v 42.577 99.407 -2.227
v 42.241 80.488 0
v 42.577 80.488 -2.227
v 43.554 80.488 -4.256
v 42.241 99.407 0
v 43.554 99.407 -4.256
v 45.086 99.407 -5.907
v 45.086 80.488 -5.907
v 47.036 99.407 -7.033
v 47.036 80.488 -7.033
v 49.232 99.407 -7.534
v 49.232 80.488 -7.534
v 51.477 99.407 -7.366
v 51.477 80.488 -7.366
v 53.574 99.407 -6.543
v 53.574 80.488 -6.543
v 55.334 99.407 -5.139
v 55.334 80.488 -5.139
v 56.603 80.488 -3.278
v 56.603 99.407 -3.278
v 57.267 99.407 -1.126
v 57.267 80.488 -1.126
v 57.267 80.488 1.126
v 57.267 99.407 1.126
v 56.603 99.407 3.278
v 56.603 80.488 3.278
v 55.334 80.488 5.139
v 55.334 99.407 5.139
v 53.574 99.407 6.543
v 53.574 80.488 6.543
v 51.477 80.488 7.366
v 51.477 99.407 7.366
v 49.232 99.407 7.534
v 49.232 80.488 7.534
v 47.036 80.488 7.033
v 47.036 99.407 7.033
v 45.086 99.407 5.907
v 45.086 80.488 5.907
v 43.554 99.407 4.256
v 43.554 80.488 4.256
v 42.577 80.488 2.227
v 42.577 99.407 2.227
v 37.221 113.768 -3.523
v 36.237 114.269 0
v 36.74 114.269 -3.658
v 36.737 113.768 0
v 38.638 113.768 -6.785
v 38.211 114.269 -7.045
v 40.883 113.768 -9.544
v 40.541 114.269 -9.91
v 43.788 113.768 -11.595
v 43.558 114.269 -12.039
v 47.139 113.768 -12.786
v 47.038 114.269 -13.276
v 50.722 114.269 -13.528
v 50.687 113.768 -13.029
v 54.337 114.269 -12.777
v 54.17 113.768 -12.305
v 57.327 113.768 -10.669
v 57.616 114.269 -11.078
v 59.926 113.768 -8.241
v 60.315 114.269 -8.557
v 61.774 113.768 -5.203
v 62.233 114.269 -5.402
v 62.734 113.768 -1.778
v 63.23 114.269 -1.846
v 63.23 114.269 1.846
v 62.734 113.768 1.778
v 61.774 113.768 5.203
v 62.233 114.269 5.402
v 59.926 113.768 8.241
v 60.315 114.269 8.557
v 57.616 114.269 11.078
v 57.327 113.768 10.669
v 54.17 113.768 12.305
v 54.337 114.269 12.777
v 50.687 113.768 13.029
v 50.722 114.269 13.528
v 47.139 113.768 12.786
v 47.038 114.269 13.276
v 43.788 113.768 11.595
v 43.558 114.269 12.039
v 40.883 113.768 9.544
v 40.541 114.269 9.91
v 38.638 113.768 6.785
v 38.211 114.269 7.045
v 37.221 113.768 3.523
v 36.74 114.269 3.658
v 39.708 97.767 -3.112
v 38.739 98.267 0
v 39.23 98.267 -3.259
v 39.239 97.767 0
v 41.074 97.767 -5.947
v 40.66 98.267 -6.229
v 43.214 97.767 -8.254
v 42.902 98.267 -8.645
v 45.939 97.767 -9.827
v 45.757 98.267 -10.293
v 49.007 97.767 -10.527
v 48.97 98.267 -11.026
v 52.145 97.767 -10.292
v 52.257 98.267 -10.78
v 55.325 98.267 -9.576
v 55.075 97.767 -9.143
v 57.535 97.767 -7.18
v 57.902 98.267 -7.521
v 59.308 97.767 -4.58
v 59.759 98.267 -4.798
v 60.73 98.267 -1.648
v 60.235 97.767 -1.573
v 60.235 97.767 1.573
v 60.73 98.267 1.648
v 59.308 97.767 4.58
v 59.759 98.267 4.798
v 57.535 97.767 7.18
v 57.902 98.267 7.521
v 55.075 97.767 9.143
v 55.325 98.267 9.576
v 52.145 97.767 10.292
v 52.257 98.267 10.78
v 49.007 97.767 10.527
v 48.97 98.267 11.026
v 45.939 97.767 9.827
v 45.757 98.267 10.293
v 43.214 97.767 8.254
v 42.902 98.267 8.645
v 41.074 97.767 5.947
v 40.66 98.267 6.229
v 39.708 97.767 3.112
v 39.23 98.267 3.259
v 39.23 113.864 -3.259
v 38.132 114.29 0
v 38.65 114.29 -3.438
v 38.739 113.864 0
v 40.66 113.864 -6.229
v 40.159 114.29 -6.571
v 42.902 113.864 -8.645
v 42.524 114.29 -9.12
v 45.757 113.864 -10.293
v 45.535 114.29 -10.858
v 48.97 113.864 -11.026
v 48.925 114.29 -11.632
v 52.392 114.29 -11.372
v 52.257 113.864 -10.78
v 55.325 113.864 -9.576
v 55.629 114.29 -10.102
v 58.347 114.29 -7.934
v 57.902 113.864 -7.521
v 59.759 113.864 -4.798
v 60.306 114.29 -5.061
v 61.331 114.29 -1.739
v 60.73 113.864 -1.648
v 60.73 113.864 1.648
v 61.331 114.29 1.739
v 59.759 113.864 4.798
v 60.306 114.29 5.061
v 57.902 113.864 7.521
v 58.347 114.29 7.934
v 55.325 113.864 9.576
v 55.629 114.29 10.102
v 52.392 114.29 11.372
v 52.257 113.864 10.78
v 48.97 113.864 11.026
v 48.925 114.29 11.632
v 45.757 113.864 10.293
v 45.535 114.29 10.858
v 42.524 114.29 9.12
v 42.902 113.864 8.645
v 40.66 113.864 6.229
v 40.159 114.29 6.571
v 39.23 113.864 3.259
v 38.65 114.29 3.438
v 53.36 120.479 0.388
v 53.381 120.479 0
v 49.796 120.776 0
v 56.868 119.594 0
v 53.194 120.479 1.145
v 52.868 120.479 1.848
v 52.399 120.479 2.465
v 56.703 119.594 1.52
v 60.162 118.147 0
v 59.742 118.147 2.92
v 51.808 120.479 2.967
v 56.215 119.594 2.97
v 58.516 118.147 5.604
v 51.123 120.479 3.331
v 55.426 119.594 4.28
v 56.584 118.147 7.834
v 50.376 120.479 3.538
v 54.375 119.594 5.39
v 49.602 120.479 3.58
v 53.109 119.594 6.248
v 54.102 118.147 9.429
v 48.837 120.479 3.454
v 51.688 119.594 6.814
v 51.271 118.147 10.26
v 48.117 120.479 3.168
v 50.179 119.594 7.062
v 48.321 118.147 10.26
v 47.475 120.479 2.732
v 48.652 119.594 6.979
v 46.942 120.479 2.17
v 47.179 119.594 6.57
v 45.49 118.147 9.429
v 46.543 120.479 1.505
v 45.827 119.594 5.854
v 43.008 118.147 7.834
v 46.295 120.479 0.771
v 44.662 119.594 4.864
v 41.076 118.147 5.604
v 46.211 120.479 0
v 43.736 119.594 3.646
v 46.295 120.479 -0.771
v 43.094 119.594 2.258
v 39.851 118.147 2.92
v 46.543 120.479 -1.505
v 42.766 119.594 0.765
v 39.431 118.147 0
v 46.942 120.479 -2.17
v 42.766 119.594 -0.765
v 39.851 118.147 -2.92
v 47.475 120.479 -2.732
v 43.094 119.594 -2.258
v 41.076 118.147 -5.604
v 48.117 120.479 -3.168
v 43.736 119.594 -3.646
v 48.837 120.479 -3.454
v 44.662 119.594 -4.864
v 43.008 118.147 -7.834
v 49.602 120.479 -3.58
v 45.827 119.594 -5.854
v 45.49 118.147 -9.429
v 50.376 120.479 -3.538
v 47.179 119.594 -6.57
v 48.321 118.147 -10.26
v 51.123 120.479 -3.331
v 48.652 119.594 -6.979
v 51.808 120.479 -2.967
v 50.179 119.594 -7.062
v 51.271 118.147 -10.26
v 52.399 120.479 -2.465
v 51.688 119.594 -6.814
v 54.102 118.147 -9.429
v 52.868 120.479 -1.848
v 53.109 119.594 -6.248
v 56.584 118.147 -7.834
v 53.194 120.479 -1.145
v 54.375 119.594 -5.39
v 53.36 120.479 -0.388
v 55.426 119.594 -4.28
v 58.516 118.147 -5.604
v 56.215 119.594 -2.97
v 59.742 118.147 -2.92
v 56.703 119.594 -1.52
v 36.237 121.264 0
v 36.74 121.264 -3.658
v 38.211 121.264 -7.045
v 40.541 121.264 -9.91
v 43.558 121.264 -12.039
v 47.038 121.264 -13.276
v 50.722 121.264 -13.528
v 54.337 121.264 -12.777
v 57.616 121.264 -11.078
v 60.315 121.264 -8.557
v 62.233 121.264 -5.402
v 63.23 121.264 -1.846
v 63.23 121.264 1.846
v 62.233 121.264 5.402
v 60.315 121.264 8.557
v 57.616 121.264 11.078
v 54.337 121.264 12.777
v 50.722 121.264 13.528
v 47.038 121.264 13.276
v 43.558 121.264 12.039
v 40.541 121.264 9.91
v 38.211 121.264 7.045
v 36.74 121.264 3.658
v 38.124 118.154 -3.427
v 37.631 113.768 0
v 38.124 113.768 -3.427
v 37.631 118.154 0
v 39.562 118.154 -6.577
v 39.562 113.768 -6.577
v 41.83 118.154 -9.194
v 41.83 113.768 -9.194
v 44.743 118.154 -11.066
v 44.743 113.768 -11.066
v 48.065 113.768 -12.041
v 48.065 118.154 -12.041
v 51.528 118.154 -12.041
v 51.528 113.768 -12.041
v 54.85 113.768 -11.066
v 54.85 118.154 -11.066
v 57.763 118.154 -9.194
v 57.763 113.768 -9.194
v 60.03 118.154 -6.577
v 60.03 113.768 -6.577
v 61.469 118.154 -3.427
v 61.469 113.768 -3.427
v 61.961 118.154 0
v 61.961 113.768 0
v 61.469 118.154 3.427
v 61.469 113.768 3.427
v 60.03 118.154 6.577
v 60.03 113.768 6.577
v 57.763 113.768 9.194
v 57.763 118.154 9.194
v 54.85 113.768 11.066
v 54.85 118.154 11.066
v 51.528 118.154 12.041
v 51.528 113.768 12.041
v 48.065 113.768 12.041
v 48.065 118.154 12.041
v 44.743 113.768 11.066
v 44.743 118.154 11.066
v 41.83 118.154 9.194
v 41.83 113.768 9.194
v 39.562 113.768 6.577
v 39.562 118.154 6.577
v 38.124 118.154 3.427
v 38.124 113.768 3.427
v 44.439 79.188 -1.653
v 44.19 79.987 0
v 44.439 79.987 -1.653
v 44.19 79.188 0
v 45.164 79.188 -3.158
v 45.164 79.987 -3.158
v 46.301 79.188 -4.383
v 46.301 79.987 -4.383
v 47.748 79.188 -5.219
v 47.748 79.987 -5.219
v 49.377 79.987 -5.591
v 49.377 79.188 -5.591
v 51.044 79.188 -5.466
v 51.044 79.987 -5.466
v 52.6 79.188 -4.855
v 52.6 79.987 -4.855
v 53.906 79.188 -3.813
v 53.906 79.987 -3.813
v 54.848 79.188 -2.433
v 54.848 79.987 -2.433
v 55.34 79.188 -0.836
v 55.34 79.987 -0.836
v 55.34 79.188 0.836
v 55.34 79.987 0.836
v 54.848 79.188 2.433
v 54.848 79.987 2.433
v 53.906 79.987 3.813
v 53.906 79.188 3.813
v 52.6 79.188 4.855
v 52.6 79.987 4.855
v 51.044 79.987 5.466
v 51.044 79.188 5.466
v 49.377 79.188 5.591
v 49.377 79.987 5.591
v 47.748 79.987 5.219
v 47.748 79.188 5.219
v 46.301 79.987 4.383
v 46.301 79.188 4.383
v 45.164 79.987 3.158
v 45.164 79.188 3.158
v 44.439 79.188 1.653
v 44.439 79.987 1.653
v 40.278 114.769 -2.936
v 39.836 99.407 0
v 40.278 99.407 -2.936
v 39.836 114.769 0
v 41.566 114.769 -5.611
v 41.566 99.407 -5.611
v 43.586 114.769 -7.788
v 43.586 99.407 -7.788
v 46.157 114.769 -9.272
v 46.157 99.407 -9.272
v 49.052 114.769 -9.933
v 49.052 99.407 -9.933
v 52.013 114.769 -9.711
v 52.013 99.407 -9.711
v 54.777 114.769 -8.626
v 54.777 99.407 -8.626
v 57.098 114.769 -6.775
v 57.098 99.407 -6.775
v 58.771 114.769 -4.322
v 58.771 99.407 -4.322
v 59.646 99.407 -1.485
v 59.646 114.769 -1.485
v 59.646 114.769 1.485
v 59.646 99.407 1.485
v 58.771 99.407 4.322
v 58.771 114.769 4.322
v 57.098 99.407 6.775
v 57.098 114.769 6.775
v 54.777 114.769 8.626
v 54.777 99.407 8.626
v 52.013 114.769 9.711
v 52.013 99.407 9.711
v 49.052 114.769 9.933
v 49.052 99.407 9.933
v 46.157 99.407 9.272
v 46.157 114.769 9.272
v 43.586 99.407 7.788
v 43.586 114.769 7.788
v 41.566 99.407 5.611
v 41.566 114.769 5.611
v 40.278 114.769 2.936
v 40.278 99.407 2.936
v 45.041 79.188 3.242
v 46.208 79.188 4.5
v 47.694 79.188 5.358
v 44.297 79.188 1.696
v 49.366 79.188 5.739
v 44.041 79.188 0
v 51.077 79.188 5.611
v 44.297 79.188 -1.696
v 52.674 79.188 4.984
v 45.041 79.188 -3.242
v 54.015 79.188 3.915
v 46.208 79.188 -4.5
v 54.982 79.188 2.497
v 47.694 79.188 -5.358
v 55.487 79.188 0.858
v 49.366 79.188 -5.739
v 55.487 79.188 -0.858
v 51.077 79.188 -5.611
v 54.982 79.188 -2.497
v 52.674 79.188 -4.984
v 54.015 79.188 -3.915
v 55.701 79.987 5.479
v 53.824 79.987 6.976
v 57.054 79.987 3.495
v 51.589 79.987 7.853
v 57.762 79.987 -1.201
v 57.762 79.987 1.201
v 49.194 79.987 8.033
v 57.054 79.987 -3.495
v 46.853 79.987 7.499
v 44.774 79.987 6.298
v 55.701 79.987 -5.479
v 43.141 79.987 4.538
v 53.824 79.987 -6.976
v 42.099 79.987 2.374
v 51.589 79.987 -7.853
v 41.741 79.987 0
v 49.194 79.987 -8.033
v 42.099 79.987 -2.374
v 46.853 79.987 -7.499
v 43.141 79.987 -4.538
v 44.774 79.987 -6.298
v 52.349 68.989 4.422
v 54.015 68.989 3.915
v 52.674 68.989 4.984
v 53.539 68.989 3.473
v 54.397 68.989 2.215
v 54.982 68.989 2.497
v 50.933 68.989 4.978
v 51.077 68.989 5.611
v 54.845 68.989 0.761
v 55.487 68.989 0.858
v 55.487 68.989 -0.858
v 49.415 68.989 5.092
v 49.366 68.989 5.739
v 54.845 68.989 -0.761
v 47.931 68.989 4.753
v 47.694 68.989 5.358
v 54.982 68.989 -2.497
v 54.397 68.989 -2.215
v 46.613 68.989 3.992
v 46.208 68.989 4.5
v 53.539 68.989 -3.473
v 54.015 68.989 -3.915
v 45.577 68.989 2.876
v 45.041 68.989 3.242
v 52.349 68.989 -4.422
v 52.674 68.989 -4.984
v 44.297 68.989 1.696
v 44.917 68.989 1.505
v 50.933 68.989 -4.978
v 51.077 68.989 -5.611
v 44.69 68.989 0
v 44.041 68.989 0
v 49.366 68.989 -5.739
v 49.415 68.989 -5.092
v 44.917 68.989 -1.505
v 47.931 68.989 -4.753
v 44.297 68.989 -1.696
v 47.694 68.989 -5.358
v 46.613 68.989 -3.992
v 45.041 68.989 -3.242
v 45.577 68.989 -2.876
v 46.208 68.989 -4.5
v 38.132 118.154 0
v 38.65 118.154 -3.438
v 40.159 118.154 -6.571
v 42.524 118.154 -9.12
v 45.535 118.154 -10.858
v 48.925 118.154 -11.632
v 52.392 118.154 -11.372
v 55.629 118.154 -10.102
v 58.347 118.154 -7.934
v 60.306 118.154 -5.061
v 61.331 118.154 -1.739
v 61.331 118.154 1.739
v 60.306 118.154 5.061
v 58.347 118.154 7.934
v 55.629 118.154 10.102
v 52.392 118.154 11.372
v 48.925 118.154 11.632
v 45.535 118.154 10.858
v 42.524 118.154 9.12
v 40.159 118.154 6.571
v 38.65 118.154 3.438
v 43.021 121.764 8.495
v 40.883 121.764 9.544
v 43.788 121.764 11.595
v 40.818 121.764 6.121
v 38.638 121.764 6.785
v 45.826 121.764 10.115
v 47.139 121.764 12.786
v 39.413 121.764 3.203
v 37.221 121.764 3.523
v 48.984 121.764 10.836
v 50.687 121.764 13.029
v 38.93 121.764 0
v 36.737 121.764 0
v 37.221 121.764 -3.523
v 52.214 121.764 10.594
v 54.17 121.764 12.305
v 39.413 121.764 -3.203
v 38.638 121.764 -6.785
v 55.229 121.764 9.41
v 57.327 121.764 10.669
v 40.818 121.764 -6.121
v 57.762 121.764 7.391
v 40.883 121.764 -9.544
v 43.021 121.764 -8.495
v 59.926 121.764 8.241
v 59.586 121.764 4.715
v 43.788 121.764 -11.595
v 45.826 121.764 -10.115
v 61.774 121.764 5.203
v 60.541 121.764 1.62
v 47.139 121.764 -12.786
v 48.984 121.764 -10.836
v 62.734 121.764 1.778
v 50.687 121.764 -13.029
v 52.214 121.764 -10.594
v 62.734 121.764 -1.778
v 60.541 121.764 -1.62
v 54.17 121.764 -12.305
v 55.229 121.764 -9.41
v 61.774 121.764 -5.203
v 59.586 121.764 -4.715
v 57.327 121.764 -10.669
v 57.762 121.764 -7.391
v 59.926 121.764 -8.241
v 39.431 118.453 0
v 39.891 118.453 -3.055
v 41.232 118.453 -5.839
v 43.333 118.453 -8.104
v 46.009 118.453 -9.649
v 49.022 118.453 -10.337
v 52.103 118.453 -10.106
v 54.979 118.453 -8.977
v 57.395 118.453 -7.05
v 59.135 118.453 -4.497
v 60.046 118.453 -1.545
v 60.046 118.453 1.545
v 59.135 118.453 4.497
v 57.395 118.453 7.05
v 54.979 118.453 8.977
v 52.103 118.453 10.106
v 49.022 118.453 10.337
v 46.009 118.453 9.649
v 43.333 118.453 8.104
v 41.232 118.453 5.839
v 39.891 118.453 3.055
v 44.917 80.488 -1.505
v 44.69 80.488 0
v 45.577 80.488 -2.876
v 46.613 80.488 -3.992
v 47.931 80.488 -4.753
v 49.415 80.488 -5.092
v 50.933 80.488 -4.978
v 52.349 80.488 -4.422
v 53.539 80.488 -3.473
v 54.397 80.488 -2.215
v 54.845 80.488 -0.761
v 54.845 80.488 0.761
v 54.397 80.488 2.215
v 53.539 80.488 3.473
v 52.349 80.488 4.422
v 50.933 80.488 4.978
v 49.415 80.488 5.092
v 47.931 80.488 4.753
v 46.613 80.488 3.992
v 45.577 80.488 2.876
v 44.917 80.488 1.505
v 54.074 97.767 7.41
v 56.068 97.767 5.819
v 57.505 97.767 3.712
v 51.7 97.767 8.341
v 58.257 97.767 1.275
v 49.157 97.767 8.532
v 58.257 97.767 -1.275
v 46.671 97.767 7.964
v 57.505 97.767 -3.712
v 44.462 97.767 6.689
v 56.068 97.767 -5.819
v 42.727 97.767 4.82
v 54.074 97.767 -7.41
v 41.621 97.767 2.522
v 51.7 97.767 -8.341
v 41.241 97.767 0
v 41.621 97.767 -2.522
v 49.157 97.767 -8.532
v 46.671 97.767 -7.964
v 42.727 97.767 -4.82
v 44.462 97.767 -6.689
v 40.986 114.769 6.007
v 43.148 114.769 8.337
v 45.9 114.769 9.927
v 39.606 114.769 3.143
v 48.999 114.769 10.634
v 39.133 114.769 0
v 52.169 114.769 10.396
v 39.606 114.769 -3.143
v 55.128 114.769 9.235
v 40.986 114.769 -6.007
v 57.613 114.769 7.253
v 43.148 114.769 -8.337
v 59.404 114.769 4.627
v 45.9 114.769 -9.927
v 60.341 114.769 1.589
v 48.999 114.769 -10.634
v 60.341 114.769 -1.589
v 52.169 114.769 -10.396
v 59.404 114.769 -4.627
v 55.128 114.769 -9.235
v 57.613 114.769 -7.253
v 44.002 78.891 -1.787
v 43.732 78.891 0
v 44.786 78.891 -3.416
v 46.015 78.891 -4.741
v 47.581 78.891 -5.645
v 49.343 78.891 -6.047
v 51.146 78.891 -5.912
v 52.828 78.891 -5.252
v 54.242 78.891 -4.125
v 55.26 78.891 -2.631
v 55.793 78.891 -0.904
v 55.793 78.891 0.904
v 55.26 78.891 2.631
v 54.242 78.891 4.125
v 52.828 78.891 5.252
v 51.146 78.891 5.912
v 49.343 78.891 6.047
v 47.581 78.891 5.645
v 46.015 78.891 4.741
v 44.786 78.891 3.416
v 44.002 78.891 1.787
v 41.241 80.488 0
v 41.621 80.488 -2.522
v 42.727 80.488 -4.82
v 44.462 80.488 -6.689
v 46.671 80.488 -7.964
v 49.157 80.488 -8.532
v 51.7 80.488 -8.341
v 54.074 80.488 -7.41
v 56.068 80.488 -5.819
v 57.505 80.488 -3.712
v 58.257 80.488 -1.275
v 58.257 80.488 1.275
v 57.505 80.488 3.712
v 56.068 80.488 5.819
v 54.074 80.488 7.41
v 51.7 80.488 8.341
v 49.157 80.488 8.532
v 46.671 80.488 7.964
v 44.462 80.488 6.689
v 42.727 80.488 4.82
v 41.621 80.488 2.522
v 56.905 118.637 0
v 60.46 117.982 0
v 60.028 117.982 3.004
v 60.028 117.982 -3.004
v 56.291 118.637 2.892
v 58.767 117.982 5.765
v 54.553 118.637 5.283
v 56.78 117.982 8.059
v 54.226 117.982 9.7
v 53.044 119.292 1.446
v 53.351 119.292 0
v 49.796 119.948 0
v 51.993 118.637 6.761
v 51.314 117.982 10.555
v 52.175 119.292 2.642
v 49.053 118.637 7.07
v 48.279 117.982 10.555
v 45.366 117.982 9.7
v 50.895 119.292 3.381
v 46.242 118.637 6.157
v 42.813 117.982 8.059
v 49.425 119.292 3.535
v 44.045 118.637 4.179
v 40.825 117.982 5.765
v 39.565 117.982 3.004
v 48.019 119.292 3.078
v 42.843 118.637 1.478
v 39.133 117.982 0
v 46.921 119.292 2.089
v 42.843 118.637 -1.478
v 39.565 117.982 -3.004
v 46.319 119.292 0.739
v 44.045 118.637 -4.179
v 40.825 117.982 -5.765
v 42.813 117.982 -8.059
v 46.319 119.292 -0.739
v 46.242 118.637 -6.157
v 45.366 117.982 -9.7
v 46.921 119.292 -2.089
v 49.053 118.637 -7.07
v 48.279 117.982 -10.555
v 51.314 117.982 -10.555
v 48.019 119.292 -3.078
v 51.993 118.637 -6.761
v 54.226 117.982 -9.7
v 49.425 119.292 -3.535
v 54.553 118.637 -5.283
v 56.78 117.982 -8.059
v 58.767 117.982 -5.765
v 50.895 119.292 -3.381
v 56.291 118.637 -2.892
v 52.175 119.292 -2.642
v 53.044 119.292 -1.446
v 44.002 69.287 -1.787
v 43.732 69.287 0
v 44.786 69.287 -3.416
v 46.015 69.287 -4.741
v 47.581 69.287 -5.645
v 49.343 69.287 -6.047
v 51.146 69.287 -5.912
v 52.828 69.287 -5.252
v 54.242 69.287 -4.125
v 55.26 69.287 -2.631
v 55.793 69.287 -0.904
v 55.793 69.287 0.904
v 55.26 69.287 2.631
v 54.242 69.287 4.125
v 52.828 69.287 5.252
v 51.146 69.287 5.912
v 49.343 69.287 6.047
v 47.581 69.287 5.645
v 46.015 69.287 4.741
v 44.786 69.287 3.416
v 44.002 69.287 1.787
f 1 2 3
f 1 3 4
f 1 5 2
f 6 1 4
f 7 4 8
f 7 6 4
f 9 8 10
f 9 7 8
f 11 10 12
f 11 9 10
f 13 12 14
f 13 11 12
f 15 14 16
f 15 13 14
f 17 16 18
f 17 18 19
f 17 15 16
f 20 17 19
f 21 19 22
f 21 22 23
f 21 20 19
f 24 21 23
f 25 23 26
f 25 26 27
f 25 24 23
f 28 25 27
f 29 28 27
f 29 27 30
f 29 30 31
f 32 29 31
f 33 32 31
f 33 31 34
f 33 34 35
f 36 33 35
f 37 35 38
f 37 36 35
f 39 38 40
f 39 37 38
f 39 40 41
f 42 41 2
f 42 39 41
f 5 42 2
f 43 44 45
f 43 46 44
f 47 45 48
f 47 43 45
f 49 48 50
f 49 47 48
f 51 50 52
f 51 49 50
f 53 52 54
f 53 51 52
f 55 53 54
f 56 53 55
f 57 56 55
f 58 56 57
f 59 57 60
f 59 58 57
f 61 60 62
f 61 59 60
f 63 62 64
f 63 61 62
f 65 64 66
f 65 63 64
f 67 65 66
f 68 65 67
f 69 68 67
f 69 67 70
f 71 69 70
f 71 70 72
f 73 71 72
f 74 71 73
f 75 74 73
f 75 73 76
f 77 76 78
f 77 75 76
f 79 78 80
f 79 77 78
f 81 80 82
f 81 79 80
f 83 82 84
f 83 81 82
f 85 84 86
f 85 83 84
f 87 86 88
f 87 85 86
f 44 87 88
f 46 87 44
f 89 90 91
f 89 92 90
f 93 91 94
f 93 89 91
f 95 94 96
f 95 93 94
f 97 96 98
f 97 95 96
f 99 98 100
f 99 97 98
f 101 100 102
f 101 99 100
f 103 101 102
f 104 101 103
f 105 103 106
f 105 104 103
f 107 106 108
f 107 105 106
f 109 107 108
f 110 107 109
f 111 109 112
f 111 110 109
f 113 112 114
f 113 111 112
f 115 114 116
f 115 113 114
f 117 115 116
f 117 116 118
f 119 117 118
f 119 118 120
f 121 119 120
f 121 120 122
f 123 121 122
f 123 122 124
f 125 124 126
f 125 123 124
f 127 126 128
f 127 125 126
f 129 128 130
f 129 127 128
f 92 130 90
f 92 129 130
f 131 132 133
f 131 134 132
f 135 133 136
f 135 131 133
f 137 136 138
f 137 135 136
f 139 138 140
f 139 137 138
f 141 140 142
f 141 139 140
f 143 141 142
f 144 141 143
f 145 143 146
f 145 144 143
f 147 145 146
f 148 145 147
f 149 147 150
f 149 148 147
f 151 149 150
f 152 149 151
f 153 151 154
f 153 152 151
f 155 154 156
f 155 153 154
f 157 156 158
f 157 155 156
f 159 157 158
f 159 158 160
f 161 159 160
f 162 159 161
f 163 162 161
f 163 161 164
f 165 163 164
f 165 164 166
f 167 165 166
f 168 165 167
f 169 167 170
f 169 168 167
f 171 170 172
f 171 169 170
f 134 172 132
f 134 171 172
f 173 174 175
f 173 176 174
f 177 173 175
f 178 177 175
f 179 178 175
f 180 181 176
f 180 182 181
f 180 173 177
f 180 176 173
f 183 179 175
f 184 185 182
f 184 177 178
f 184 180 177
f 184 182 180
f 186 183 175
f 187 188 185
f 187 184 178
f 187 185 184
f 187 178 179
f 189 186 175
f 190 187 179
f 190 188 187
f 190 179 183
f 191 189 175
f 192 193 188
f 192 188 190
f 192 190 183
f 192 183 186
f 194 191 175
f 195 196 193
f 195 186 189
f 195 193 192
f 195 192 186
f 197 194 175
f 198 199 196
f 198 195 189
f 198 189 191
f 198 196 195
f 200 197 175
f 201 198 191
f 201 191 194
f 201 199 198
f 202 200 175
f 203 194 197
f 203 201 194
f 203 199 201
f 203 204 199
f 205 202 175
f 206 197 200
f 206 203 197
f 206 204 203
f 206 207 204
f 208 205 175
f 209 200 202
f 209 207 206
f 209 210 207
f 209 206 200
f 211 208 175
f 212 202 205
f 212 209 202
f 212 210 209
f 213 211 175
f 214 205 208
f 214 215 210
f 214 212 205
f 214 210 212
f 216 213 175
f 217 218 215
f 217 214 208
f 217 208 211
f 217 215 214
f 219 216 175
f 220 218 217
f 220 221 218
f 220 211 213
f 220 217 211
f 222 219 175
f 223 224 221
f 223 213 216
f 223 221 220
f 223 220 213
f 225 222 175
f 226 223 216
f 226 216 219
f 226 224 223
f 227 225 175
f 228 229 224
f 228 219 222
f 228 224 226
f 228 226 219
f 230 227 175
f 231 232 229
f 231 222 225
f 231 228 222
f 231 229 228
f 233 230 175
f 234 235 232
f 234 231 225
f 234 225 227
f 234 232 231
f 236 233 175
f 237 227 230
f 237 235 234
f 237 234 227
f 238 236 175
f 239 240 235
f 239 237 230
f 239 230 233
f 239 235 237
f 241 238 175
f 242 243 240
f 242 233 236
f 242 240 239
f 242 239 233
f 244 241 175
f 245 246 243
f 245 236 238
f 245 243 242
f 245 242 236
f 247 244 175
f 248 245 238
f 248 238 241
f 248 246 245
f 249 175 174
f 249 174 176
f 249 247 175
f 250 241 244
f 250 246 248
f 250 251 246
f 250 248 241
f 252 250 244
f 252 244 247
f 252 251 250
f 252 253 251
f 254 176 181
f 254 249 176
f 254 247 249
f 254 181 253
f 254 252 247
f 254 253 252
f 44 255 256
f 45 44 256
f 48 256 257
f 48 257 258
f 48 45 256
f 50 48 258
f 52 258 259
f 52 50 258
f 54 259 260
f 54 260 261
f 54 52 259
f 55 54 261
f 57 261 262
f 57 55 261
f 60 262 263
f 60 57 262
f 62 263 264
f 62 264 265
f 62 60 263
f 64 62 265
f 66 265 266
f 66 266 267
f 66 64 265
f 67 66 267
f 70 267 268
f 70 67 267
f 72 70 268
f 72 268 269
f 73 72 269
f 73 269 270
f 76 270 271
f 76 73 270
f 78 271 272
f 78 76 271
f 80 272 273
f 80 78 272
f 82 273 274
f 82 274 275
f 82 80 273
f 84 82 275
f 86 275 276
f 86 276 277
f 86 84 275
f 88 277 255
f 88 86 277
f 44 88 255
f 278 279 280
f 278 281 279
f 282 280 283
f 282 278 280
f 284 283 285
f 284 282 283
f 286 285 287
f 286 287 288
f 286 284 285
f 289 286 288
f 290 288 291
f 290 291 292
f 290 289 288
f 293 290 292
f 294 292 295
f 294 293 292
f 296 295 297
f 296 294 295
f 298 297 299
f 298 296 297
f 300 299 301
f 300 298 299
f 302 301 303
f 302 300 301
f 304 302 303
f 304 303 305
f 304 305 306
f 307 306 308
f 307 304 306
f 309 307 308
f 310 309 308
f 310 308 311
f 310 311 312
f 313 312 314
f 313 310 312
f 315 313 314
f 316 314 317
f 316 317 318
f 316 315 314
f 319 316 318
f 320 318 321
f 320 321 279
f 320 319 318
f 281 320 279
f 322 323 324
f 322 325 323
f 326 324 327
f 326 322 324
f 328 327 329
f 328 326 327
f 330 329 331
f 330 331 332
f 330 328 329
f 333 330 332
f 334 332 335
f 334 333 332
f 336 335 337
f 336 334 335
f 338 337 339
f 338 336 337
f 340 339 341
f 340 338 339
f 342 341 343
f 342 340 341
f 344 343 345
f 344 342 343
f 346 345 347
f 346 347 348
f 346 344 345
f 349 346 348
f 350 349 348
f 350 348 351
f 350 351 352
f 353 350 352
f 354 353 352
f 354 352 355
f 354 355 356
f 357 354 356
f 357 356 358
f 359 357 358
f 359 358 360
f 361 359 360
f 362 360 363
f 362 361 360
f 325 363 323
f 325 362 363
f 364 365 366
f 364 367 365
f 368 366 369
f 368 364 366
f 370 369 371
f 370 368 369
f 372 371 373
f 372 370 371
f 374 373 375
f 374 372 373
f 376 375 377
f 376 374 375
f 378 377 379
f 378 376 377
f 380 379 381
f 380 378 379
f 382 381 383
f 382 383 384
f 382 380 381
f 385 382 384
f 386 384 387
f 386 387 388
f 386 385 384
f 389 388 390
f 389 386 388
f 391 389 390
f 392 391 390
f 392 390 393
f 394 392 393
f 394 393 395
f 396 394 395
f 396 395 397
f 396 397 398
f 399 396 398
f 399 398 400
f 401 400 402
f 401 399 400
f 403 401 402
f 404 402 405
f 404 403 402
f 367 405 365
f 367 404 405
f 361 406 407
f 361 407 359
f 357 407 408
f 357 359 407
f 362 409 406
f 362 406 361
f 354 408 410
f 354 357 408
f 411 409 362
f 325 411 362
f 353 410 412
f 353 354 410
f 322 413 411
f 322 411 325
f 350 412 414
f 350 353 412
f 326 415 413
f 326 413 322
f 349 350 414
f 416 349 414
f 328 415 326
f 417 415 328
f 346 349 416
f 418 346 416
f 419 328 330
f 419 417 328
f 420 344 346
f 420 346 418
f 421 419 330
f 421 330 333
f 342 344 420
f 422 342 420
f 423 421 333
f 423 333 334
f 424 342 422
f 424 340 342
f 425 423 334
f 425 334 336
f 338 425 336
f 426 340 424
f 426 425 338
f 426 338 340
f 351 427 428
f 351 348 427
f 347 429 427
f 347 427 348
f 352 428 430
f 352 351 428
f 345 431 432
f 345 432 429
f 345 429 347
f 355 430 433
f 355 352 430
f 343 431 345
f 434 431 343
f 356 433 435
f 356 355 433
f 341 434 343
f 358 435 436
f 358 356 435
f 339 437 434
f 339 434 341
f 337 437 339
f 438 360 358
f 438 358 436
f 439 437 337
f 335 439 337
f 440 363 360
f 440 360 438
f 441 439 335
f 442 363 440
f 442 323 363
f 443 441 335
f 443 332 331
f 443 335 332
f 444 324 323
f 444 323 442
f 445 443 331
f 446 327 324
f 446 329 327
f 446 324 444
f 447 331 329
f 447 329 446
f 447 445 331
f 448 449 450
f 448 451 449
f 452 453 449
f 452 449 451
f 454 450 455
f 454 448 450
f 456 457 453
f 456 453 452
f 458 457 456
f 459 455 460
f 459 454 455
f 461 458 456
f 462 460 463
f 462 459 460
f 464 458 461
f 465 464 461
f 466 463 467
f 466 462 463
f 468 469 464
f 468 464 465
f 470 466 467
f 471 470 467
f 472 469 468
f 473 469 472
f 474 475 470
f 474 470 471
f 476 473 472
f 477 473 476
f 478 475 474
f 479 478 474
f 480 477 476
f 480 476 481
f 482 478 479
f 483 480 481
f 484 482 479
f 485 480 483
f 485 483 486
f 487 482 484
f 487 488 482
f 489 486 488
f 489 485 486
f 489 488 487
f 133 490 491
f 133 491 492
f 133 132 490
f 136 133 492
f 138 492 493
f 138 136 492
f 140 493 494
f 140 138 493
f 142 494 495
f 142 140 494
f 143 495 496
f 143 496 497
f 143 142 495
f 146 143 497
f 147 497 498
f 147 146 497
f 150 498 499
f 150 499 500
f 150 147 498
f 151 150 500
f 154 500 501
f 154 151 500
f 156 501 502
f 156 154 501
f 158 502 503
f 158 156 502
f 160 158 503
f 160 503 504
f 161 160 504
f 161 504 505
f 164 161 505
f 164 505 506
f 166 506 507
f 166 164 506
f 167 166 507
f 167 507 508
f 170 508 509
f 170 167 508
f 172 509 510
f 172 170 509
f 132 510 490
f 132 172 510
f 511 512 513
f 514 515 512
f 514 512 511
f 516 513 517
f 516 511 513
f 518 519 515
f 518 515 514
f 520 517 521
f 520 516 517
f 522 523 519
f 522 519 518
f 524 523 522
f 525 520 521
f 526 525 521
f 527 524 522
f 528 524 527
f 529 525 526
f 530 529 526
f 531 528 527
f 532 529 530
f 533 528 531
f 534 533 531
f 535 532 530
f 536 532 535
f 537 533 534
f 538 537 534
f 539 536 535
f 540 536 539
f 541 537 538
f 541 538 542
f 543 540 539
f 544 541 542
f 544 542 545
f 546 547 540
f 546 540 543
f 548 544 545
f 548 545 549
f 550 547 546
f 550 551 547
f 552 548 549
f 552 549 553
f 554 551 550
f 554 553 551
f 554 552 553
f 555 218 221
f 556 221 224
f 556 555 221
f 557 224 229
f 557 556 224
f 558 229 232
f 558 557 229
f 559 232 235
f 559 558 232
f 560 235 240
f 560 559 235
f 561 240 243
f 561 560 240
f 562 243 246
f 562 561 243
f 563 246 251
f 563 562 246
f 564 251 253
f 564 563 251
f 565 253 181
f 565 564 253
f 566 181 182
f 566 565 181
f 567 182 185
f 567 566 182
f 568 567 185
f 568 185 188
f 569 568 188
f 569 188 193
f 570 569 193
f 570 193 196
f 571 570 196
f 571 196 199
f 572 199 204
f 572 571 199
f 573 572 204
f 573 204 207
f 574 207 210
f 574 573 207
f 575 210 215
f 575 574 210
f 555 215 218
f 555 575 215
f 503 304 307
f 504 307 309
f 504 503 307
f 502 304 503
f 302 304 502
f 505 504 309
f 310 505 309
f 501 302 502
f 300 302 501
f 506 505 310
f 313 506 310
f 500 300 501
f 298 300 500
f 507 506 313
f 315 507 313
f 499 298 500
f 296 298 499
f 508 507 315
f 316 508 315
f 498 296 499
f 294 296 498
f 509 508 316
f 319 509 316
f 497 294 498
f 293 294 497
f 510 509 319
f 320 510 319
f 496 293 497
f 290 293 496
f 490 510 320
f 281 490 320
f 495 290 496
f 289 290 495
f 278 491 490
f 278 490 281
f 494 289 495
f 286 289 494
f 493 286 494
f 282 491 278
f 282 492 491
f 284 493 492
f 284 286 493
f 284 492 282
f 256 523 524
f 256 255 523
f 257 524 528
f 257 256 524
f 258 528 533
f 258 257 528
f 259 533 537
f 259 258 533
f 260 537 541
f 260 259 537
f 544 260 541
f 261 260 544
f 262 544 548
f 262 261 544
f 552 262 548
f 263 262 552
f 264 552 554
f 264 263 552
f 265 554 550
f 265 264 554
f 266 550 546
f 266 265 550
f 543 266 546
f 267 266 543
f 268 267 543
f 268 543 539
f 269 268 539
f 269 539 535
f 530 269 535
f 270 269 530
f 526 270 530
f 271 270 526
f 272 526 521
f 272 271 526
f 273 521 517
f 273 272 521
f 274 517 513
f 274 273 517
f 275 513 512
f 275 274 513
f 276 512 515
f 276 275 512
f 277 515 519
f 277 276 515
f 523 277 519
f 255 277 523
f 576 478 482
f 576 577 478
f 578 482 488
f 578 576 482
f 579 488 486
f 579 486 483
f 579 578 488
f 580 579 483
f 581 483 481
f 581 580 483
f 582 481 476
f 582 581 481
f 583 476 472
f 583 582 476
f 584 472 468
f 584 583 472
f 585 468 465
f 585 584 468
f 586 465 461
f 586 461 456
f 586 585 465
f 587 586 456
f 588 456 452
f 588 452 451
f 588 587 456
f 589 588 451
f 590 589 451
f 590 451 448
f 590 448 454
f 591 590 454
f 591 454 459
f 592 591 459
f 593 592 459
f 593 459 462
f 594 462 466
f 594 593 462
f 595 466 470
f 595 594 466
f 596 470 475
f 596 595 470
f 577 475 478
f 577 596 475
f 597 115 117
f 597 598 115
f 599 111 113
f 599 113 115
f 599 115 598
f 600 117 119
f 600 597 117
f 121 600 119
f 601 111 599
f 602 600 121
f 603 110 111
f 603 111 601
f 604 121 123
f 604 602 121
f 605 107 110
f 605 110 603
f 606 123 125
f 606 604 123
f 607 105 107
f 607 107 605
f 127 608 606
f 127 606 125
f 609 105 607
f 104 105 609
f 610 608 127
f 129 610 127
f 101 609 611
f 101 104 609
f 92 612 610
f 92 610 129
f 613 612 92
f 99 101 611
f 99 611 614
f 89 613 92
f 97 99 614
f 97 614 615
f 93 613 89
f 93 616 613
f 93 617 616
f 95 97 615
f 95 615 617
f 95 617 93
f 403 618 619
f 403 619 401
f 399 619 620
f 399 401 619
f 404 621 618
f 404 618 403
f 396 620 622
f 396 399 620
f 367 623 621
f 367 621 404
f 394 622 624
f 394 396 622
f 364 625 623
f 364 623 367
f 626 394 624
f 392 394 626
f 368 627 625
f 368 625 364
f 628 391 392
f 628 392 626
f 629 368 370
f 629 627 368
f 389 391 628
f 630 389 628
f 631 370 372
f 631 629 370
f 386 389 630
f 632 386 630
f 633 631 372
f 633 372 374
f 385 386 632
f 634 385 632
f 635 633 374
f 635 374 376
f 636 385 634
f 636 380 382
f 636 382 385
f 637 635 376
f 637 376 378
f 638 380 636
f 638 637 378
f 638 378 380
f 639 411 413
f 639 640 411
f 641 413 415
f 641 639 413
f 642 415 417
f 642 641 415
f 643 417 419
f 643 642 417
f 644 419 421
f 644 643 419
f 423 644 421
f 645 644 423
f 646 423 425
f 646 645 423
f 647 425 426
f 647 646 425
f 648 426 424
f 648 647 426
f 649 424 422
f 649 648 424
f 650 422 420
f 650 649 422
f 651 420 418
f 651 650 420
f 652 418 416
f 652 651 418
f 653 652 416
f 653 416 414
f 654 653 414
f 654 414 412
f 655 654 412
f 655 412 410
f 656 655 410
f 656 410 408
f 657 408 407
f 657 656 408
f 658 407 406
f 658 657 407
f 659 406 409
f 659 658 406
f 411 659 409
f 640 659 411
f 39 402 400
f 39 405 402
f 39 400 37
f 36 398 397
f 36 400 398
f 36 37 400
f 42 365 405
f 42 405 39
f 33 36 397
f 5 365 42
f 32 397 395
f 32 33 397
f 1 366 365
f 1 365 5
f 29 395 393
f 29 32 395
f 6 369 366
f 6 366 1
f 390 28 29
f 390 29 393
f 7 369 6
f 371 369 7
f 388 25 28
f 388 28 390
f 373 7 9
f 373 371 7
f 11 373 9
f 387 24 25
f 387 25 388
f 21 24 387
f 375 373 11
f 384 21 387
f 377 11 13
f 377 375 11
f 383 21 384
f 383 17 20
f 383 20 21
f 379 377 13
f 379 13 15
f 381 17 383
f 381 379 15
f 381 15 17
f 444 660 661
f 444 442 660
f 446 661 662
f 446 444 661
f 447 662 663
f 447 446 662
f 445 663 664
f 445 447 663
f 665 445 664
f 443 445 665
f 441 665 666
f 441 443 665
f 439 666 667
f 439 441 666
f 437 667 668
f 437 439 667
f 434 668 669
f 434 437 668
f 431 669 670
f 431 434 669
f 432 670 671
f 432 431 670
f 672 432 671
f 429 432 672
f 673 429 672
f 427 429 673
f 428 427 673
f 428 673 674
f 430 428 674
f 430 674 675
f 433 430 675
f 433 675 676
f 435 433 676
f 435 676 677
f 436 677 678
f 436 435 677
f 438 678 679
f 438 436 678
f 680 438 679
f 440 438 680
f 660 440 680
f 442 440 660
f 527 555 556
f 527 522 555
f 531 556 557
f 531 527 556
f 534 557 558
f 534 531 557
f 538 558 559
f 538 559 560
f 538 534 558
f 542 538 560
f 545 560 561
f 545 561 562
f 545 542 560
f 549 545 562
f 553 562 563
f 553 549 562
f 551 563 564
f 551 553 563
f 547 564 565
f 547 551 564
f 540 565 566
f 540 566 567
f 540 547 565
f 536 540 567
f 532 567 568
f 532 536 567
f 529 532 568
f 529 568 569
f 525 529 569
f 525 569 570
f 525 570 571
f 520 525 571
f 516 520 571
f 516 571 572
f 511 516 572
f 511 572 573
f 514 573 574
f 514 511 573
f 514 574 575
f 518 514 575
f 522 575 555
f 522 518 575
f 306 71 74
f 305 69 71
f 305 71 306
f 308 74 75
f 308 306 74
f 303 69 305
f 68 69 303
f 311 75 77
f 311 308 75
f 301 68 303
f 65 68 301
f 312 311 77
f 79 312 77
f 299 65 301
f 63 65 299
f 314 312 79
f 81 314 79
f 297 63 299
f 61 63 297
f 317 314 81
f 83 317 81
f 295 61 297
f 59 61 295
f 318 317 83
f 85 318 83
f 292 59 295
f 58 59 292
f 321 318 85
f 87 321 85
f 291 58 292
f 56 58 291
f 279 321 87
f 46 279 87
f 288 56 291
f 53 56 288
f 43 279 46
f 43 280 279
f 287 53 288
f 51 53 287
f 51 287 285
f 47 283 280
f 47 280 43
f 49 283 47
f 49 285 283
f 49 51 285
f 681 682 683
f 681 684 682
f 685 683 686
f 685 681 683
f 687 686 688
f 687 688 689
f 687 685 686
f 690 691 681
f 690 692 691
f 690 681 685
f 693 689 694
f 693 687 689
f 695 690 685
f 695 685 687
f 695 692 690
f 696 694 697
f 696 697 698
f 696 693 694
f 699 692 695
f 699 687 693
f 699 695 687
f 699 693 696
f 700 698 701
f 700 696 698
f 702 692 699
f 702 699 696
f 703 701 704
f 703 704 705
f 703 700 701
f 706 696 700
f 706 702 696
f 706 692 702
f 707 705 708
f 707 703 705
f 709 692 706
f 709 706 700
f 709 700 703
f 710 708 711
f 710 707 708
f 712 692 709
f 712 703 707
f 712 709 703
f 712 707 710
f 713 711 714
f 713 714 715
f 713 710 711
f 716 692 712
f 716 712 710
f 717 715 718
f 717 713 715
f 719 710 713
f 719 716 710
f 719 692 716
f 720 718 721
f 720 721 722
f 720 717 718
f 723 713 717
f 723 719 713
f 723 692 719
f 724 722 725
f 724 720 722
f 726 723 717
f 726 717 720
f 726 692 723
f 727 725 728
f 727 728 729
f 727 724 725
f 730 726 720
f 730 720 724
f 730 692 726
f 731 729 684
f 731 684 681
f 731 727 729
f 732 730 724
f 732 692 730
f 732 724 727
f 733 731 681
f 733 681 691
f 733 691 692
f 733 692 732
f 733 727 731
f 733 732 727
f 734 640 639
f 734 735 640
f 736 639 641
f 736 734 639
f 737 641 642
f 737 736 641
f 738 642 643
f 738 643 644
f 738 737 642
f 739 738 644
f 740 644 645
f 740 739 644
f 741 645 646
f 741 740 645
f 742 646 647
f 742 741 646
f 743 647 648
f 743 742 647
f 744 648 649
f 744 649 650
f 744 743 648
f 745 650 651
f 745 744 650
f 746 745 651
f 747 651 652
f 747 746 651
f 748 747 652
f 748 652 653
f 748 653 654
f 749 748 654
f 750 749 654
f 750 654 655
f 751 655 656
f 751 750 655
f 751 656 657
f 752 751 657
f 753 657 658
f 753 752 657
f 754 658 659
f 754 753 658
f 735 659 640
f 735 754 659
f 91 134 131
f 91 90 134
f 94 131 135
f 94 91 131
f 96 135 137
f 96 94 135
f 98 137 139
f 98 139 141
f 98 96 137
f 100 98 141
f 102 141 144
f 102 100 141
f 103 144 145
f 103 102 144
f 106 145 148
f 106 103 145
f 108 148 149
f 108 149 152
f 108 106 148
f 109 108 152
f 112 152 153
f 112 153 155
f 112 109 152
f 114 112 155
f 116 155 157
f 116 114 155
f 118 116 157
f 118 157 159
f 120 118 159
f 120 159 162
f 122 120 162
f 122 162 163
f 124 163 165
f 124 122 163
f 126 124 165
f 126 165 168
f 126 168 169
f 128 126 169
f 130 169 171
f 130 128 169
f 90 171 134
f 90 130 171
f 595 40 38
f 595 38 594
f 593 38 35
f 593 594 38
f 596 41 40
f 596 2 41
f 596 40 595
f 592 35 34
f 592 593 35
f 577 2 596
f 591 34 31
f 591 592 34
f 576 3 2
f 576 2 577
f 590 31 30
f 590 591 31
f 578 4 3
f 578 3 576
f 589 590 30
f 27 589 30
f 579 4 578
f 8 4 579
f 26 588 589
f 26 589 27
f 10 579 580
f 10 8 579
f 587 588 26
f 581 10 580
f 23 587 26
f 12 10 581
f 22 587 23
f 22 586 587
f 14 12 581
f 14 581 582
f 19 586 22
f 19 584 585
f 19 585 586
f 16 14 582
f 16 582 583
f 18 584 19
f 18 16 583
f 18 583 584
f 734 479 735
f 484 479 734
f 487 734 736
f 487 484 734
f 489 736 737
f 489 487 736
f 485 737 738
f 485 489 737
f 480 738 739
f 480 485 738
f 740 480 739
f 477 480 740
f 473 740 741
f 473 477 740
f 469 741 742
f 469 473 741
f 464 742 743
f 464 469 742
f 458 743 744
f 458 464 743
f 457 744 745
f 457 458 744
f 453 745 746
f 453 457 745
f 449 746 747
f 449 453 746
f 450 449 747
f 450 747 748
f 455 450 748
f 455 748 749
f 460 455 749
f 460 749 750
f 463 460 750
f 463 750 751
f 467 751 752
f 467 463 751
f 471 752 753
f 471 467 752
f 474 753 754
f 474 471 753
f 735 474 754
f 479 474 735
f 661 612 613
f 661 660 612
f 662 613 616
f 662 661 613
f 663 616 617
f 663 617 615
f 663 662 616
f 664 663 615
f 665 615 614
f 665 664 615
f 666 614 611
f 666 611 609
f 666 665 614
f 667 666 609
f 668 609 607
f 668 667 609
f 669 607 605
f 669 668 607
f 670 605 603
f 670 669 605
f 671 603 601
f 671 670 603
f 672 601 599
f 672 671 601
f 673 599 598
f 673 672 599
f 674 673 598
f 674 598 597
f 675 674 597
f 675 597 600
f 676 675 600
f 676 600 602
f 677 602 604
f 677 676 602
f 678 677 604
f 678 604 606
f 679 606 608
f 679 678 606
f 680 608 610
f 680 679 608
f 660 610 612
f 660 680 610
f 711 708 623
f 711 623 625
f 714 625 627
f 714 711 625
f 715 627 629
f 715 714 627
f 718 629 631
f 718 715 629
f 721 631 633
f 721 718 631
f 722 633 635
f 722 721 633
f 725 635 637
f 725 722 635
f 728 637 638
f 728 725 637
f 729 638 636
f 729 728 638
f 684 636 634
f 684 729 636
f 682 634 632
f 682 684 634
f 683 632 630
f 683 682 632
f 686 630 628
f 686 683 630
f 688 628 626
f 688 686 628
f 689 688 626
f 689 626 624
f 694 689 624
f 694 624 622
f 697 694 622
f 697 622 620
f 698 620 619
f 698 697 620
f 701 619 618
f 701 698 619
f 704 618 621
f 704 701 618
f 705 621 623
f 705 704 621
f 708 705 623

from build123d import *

# Parameters (mm, degrees)
SCALE1_SCALE = 0.502986482


with BuildPart() as part:
    # Model → Revolve1 (revolve)
    with BuildSketch(Plane.XY):
        with BuildLine():
            Line((28.595574, 124.840746), (28.595574, 131.228004974))
            ThreePointArc((28.595574, 131.228004974), (28.89122421, 131.392844904), (29.188156, 131.555364935))
            Line((29.188156, 131.555364935), (29.188156, 132.16509))
            Line((29.188156, 132.16509), (28.193238, 138.747754))
            Line((28.193238, 138.747754), (23.8331756, 138.747754))
            Line((23.8331756, 138.747754), (22.8382322, 137.752582))
            Line((22.8382322, 137.752582), (22.8382322, 123.845828))
            Line((22.8382322, 123.845828), (23.8331756, 122.850656))
            Line((23.8331756, 122.850656), (25.61082, 122.850656))
            Line((25.61082, 122.850656), (25.61082, 131.570984))
            Line((25.61082, 131.570984), (26.605738, 131.570984))
            Line((26.605738, 131.570984), (26.605738, 123.8885))
            Line((26.605738, 123.8885), (27.813, 123.040902))
            Line((27.813, 123.040902), (27.813, 92.032328))
            Line((27.813, 92.032328), (28.807918, 91.03741))
            Line((28.807918, 91.03741), (32.78632, 91.03741))
            Line((32.78632, 91.03741), (32.78632, 56.684418))
            Line((32.78632, 56.684418), (33.781238, 55.689246))
            Line((33.781238, 55.689246), (38.64991, 55.689246))
            Line((38.64991, 55.689246), (38.64991, 54.101746))
            Line((38.64991, 54.101746), (38.353746, 54.101746))
            Line((38.353746, 54.101746), (37.740082, 53.509418))
            Line((37.740082, 53.509418), (37.740082, 34.416492))
            Line((37.740082, 34.416492), (38.353746, 33.82391))
            Line((38.353746, 33.82391), (39.644828, 33.82391))
            Line((39.644828, 33.82391), (39.644828, 56.684418))
            Line((39.644828, 56.684418), (34.776156, 56.684418))
            Line((34.776156, 56.684418), (34.776156, 94.297754))
            Line((34.776156, 94.297754), (29.993082, 94.297754))
            Line((29.993082, 94.297754), (29.993082, 124.840746))
            Line((29.993082, 124.840746), (28.595574, 124.840746))
        make_face()
    revolve(axis=Axis((49.796303883, 136.783225344, 0), (0, -1, 0)))

    # Model<3> → Revolve2 (revolve)
    with BuildSketch(Plane.XY):
        with BuildLine():
            ThreePointArc((29.188156, 131.555364935), (28.89122421, 131.392844904), (28.595574, 131.228004974))
            Line((28.595574, 131.228004974), (49.796303883, 135.136111003))
            Line((49.796303883, 135.136111003), (49.796303883, 136.783225344))
            ThreePointArc((49.796303883, 136.783225344), (39.165849005, 135.455883929), (29.188156, 131.555364935))
        make_face()
    revolve(axis=Axis((49.796303883, 136.783225344, 0), (0, -1, 0)))


with BuildPart() as part_1:
    # Scale1: scaled about (49.796303883, 104.576694566, 0)
    add(part.part.scale(SCALE1_SCALE).moved(Location((24.749436164, 51.976030842, 0))))


solid = part_1.part
